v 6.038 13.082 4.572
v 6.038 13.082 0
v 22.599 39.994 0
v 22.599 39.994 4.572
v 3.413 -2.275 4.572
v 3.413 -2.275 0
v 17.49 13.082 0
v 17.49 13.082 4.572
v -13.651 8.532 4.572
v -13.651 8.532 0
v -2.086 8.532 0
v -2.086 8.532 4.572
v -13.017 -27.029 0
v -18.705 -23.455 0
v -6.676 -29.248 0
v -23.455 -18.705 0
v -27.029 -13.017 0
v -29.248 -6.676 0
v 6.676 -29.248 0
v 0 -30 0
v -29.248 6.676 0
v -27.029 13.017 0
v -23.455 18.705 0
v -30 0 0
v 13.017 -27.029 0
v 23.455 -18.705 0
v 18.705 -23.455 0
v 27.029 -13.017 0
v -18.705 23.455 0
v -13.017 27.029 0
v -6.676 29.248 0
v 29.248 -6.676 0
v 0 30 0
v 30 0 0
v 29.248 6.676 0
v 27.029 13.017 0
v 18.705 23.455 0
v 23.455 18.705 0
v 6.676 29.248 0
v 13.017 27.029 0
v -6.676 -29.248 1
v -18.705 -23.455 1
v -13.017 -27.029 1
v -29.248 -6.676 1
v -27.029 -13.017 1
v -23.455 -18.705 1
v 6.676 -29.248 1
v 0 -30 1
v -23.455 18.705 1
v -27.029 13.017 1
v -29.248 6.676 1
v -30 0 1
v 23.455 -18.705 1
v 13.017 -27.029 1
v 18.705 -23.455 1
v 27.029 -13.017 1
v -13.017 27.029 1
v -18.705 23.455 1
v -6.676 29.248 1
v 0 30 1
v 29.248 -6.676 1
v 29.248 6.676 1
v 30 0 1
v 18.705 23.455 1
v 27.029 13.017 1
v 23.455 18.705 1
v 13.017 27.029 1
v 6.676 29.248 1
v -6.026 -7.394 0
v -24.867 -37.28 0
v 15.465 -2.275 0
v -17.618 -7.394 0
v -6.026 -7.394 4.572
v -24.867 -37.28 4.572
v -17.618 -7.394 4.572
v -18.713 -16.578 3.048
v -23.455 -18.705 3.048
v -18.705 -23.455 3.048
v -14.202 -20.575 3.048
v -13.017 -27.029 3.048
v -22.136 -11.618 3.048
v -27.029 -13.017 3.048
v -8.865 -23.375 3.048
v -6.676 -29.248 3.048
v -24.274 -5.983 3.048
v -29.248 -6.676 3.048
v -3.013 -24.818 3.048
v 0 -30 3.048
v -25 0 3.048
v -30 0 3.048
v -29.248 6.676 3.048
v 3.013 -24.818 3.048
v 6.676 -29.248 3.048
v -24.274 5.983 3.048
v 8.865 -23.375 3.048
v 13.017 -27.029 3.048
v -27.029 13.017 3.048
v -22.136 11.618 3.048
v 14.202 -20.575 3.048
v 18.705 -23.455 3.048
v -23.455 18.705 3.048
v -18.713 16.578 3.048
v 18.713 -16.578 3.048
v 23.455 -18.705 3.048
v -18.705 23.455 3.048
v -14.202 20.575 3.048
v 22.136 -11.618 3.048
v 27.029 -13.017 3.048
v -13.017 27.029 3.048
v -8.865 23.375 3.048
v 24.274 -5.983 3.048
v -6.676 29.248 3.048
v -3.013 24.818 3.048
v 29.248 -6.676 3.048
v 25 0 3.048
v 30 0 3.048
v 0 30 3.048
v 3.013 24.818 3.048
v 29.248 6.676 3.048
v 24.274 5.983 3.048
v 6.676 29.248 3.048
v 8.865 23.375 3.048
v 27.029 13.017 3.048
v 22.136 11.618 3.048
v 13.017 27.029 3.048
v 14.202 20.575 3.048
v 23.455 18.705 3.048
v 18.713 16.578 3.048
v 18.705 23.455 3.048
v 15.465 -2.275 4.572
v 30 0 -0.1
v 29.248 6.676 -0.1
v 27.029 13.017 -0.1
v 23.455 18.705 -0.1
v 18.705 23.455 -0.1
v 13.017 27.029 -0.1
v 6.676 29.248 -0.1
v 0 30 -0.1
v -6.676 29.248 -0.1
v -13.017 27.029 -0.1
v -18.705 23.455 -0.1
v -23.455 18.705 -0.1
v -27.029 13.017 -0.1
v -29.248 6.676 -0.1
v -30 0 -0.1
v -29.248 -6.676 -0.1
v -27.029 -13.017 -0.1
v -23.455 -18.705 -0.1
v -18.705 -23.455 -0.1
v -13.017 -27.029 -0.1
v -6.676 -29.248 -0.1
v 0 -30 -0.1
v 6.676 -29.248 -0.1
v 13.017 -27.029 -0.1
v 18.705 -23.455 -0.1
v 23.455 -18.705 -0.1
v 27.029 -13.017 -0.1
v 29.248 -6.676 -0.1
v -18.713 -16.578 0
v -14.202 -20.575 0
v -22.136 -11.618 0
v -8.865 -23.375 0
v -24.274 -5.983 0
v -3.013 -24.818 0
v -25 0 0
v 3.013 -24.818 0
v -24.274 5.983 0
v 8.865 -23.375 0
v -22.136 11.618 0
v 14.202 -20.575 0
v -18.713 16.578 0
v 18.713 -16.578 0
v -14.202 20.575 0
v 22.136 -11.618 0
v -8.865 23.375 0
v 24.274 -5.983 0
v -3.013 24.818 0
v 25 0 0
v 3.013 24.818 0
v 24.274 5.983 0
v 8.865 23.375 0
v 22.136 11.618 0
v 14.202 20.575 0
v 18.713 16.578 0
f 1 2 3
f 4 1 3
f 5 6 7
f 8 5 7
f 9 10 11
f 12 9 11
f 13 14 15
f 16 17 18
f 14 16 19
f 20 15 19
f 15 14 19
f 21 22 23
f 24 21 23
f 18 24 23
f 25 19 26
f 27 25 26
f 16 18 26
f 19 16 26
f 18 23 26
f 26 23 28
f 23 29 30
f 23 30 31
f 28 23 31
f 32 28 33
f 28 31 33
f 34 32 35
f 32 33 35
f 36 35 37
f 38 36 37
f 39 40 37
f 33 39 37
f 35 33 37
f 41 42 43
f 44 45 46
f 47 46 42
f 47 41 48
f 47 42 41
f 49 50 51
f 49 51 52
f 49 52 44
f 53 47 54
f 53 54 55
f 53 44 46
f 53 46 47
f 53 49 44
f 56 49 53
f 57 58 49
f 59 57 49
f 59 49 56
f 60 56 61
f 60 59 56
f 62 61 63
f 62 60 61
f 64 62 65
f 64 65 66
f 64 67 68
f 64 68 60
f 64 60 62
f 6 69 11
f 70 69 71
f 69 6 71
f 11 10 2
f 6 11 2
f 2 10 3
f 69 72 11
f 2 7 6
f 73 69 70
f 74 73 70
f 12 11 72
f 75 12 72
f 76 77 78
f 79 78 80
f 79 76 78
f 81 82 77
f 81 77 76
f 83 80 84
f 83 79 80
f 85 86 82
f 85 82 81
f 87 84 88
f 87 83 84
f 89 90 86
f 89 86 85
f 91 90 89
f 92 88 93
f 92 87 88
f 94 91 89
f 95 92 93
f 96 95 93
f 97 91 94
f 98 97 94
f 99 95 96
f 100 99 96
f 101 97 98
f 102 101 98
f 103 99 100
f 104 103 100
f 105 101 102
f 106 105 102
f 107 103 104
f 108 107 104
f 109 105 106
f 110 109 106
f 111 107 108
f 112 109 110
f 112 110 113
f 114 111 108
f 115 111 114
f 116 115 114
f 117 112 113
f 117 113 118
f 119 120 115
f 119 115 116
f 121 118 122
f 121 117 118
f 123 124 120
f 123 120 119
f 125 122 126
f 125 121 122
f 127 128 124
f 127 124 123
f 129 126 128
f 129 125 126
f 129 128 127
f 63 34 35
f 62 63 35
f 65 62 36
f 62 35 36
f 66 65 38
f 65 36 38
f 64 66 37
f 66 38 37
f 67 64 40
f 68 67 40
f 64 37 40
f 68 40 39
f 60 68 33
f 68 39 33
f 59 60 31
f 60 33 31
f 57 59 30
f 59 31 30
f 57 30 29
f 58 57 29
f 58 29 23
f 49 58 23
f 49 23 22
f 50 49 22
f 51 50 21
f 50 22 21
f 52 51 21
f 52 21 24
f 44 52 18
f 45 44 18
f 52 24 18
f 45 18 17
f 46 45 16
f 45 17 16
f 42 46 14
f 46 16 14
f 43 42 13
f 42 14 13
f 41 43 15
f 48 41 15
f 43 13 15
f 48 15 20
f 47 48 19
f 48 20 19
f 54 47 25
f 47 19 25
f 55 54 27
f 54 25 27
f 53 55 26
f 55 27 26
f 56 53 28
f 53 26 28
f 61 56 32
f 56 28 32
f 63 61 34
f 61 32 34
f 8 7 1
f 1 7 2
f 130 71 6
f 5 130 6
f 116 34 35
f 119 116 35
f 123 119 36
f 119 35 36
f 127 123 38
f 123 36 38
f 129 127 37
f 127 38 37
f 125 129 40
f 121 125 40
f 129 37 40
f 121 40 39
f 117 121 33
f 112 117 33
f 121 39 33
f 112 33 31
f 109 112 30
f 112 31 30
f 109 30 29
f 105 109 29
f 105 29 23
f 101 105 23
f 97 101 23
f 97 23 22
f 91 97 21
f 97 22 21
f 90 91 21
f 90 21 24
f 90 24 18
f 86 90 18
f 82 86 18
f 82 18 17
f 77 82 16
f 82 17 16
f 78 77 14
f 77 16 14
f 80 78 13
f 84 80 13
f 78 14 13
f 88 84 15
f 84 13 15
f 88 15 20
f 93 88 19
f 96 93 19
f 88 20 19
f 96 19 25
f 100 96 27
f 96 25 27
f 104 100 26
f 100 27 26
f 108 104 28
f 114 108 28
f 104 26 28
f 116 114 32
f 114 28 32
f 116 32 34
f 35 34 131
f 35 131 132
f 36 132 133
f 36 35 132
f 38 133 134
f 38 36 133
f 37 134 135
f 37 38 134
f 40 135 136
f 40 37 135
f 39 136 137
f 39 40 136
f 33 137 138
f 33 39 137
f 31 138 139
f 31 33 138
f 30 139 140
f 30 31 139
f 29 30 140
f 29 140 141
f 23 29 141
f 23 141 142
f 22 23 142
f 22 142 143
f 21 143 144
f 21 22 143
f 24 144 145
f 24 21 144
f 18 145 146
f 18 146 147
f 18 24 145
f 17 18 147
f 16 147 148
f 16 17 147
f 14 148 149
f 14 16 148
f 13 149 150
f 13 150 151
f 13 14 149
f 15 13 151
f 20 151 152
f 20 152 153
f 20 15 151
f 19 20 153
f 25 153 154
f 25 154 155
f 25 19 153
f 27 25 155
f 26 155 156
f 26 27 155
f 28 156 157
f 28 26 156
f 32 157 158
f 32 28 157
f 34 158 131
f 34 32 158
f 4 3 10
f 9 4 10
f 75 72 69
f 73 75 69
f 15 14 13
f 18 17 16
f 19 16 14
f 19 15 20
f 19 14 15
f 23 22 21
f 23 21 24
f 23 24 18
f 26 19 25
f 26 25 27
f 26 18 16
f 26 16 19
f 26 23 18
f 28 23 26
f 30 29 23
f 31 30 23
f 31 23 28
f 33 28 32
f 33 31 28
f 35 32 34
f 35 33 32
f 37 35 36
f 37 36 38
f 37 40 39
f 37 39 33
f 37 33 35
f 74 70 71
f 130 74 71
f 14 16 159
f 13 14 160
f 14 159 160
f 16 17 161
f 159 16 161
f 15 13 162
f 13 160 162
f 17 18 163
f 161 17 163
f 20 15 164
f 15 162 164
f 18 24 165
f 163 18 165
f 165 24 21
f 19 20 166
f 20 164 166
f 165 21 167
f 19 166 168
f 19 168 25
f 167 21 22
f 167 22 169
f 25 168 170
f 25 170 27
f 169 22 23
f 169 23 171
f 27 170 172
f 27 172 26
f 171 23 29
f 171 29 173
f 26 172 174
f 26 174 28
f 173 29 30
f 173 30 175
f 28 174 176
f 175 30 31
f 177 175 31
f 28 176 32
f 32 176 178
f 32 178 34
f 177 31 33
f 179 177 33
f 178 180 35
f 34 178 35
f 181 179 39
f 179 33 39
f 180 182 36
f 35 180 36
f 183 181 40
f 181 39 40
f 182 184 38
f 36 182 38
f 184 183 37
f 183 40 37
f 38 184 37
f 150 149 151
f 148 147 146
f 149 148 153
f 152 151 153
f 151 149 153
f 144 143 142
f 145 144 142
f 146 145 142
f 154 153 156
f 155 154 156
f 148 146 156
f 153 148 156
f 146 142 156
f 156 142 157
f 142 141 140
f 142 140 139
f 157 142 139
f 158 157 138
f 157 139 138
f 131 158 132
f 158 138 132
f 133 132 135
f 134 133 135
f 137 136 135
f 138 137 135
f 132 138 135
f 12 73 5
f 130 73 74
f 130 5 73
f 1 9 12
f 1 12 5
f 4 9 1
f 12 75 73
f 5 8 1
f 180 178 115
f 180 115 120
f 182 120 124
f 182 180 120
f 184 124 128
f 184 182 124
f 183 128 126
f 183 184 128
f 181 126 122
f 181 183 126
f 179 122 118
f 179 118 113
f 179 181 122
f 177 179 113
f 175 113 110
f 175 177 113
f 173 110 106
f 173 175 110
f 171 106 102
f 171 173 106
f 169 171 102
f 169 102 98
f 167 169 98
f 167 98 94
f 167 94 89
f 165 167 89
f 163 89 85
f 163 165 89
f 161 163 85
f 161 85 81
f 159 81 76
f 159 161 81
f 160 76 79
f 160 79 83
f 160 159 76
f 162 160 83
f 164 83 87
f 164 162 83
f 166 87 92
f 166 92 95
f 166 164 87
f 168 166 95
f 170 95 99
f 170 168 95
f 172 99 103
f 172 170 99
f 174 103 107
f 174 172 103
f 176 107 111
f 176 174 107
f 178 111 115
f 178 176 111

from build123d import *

# Parameters (mm, degrees)
F1_R     = 30
F1_R_2   = 25
F5_DEPTH = 1
F6_DEPTH = 0.1
F7_DEPTH = 3.048
F8_DEPTH = 4.572


# Not quite as in the source:
# - the program builds the solid bodies; features that only make, move or delete a surface that nothing else refers to are left out


with BuildPart() as f5:
    # F1 (on face) → F5 (new body)
    with BuildSketch(Plane.XY):
        Circle(F1_R)
        Circle(F1_R_2, mode=Mode.SUBTRACT)
        Circle(F1_R_2)
    extrude(amount=F5_DEPTH)


with BuildPart() as f6:
    # F1 (on face) → F6 (new body)
    with BuildSketch(Plane.XY):
        Circle(F1_R)
        Circle(F1_R_2, mode=Mode.SUBTRACT)
        Circle(F1_R_2)
    extrude(amount=-F6_DEPTH)


with BuildPart() as f7:
    # F1 (on face) → F7 (new body)
    with BuildSketch(Plane.XY):
        Circle(F1_R)
        Circle(F1_R_2, mode=Mode.SUBTRACT)
    extrude(amount=F7_DEPTH)


with BuildPart() as f8:
    # F2 (on Top) → F8 (new body)
    with BuildSketch(Plane.XY):
        Polygon((6.0379398285, 13.0822043866), (22.5992734988, 39.9943725895), (-13.6509970043, 8.5318721831), (-2.0855690818, 8.5318721831), (-17.6184918681, -7.3942895979), (-6.025892119, -7.3942895979), (-24.8665944569, -37.2795380606), (15.4645281288, -2.2751658689), (3.412750084, -2.2751658689), (17.4903385899, 13.0822043866), align=None)
    extrude(amount=F8_DEPTH)


solid = Compound([f5.part, f6.part, f7.part, f8.part])
